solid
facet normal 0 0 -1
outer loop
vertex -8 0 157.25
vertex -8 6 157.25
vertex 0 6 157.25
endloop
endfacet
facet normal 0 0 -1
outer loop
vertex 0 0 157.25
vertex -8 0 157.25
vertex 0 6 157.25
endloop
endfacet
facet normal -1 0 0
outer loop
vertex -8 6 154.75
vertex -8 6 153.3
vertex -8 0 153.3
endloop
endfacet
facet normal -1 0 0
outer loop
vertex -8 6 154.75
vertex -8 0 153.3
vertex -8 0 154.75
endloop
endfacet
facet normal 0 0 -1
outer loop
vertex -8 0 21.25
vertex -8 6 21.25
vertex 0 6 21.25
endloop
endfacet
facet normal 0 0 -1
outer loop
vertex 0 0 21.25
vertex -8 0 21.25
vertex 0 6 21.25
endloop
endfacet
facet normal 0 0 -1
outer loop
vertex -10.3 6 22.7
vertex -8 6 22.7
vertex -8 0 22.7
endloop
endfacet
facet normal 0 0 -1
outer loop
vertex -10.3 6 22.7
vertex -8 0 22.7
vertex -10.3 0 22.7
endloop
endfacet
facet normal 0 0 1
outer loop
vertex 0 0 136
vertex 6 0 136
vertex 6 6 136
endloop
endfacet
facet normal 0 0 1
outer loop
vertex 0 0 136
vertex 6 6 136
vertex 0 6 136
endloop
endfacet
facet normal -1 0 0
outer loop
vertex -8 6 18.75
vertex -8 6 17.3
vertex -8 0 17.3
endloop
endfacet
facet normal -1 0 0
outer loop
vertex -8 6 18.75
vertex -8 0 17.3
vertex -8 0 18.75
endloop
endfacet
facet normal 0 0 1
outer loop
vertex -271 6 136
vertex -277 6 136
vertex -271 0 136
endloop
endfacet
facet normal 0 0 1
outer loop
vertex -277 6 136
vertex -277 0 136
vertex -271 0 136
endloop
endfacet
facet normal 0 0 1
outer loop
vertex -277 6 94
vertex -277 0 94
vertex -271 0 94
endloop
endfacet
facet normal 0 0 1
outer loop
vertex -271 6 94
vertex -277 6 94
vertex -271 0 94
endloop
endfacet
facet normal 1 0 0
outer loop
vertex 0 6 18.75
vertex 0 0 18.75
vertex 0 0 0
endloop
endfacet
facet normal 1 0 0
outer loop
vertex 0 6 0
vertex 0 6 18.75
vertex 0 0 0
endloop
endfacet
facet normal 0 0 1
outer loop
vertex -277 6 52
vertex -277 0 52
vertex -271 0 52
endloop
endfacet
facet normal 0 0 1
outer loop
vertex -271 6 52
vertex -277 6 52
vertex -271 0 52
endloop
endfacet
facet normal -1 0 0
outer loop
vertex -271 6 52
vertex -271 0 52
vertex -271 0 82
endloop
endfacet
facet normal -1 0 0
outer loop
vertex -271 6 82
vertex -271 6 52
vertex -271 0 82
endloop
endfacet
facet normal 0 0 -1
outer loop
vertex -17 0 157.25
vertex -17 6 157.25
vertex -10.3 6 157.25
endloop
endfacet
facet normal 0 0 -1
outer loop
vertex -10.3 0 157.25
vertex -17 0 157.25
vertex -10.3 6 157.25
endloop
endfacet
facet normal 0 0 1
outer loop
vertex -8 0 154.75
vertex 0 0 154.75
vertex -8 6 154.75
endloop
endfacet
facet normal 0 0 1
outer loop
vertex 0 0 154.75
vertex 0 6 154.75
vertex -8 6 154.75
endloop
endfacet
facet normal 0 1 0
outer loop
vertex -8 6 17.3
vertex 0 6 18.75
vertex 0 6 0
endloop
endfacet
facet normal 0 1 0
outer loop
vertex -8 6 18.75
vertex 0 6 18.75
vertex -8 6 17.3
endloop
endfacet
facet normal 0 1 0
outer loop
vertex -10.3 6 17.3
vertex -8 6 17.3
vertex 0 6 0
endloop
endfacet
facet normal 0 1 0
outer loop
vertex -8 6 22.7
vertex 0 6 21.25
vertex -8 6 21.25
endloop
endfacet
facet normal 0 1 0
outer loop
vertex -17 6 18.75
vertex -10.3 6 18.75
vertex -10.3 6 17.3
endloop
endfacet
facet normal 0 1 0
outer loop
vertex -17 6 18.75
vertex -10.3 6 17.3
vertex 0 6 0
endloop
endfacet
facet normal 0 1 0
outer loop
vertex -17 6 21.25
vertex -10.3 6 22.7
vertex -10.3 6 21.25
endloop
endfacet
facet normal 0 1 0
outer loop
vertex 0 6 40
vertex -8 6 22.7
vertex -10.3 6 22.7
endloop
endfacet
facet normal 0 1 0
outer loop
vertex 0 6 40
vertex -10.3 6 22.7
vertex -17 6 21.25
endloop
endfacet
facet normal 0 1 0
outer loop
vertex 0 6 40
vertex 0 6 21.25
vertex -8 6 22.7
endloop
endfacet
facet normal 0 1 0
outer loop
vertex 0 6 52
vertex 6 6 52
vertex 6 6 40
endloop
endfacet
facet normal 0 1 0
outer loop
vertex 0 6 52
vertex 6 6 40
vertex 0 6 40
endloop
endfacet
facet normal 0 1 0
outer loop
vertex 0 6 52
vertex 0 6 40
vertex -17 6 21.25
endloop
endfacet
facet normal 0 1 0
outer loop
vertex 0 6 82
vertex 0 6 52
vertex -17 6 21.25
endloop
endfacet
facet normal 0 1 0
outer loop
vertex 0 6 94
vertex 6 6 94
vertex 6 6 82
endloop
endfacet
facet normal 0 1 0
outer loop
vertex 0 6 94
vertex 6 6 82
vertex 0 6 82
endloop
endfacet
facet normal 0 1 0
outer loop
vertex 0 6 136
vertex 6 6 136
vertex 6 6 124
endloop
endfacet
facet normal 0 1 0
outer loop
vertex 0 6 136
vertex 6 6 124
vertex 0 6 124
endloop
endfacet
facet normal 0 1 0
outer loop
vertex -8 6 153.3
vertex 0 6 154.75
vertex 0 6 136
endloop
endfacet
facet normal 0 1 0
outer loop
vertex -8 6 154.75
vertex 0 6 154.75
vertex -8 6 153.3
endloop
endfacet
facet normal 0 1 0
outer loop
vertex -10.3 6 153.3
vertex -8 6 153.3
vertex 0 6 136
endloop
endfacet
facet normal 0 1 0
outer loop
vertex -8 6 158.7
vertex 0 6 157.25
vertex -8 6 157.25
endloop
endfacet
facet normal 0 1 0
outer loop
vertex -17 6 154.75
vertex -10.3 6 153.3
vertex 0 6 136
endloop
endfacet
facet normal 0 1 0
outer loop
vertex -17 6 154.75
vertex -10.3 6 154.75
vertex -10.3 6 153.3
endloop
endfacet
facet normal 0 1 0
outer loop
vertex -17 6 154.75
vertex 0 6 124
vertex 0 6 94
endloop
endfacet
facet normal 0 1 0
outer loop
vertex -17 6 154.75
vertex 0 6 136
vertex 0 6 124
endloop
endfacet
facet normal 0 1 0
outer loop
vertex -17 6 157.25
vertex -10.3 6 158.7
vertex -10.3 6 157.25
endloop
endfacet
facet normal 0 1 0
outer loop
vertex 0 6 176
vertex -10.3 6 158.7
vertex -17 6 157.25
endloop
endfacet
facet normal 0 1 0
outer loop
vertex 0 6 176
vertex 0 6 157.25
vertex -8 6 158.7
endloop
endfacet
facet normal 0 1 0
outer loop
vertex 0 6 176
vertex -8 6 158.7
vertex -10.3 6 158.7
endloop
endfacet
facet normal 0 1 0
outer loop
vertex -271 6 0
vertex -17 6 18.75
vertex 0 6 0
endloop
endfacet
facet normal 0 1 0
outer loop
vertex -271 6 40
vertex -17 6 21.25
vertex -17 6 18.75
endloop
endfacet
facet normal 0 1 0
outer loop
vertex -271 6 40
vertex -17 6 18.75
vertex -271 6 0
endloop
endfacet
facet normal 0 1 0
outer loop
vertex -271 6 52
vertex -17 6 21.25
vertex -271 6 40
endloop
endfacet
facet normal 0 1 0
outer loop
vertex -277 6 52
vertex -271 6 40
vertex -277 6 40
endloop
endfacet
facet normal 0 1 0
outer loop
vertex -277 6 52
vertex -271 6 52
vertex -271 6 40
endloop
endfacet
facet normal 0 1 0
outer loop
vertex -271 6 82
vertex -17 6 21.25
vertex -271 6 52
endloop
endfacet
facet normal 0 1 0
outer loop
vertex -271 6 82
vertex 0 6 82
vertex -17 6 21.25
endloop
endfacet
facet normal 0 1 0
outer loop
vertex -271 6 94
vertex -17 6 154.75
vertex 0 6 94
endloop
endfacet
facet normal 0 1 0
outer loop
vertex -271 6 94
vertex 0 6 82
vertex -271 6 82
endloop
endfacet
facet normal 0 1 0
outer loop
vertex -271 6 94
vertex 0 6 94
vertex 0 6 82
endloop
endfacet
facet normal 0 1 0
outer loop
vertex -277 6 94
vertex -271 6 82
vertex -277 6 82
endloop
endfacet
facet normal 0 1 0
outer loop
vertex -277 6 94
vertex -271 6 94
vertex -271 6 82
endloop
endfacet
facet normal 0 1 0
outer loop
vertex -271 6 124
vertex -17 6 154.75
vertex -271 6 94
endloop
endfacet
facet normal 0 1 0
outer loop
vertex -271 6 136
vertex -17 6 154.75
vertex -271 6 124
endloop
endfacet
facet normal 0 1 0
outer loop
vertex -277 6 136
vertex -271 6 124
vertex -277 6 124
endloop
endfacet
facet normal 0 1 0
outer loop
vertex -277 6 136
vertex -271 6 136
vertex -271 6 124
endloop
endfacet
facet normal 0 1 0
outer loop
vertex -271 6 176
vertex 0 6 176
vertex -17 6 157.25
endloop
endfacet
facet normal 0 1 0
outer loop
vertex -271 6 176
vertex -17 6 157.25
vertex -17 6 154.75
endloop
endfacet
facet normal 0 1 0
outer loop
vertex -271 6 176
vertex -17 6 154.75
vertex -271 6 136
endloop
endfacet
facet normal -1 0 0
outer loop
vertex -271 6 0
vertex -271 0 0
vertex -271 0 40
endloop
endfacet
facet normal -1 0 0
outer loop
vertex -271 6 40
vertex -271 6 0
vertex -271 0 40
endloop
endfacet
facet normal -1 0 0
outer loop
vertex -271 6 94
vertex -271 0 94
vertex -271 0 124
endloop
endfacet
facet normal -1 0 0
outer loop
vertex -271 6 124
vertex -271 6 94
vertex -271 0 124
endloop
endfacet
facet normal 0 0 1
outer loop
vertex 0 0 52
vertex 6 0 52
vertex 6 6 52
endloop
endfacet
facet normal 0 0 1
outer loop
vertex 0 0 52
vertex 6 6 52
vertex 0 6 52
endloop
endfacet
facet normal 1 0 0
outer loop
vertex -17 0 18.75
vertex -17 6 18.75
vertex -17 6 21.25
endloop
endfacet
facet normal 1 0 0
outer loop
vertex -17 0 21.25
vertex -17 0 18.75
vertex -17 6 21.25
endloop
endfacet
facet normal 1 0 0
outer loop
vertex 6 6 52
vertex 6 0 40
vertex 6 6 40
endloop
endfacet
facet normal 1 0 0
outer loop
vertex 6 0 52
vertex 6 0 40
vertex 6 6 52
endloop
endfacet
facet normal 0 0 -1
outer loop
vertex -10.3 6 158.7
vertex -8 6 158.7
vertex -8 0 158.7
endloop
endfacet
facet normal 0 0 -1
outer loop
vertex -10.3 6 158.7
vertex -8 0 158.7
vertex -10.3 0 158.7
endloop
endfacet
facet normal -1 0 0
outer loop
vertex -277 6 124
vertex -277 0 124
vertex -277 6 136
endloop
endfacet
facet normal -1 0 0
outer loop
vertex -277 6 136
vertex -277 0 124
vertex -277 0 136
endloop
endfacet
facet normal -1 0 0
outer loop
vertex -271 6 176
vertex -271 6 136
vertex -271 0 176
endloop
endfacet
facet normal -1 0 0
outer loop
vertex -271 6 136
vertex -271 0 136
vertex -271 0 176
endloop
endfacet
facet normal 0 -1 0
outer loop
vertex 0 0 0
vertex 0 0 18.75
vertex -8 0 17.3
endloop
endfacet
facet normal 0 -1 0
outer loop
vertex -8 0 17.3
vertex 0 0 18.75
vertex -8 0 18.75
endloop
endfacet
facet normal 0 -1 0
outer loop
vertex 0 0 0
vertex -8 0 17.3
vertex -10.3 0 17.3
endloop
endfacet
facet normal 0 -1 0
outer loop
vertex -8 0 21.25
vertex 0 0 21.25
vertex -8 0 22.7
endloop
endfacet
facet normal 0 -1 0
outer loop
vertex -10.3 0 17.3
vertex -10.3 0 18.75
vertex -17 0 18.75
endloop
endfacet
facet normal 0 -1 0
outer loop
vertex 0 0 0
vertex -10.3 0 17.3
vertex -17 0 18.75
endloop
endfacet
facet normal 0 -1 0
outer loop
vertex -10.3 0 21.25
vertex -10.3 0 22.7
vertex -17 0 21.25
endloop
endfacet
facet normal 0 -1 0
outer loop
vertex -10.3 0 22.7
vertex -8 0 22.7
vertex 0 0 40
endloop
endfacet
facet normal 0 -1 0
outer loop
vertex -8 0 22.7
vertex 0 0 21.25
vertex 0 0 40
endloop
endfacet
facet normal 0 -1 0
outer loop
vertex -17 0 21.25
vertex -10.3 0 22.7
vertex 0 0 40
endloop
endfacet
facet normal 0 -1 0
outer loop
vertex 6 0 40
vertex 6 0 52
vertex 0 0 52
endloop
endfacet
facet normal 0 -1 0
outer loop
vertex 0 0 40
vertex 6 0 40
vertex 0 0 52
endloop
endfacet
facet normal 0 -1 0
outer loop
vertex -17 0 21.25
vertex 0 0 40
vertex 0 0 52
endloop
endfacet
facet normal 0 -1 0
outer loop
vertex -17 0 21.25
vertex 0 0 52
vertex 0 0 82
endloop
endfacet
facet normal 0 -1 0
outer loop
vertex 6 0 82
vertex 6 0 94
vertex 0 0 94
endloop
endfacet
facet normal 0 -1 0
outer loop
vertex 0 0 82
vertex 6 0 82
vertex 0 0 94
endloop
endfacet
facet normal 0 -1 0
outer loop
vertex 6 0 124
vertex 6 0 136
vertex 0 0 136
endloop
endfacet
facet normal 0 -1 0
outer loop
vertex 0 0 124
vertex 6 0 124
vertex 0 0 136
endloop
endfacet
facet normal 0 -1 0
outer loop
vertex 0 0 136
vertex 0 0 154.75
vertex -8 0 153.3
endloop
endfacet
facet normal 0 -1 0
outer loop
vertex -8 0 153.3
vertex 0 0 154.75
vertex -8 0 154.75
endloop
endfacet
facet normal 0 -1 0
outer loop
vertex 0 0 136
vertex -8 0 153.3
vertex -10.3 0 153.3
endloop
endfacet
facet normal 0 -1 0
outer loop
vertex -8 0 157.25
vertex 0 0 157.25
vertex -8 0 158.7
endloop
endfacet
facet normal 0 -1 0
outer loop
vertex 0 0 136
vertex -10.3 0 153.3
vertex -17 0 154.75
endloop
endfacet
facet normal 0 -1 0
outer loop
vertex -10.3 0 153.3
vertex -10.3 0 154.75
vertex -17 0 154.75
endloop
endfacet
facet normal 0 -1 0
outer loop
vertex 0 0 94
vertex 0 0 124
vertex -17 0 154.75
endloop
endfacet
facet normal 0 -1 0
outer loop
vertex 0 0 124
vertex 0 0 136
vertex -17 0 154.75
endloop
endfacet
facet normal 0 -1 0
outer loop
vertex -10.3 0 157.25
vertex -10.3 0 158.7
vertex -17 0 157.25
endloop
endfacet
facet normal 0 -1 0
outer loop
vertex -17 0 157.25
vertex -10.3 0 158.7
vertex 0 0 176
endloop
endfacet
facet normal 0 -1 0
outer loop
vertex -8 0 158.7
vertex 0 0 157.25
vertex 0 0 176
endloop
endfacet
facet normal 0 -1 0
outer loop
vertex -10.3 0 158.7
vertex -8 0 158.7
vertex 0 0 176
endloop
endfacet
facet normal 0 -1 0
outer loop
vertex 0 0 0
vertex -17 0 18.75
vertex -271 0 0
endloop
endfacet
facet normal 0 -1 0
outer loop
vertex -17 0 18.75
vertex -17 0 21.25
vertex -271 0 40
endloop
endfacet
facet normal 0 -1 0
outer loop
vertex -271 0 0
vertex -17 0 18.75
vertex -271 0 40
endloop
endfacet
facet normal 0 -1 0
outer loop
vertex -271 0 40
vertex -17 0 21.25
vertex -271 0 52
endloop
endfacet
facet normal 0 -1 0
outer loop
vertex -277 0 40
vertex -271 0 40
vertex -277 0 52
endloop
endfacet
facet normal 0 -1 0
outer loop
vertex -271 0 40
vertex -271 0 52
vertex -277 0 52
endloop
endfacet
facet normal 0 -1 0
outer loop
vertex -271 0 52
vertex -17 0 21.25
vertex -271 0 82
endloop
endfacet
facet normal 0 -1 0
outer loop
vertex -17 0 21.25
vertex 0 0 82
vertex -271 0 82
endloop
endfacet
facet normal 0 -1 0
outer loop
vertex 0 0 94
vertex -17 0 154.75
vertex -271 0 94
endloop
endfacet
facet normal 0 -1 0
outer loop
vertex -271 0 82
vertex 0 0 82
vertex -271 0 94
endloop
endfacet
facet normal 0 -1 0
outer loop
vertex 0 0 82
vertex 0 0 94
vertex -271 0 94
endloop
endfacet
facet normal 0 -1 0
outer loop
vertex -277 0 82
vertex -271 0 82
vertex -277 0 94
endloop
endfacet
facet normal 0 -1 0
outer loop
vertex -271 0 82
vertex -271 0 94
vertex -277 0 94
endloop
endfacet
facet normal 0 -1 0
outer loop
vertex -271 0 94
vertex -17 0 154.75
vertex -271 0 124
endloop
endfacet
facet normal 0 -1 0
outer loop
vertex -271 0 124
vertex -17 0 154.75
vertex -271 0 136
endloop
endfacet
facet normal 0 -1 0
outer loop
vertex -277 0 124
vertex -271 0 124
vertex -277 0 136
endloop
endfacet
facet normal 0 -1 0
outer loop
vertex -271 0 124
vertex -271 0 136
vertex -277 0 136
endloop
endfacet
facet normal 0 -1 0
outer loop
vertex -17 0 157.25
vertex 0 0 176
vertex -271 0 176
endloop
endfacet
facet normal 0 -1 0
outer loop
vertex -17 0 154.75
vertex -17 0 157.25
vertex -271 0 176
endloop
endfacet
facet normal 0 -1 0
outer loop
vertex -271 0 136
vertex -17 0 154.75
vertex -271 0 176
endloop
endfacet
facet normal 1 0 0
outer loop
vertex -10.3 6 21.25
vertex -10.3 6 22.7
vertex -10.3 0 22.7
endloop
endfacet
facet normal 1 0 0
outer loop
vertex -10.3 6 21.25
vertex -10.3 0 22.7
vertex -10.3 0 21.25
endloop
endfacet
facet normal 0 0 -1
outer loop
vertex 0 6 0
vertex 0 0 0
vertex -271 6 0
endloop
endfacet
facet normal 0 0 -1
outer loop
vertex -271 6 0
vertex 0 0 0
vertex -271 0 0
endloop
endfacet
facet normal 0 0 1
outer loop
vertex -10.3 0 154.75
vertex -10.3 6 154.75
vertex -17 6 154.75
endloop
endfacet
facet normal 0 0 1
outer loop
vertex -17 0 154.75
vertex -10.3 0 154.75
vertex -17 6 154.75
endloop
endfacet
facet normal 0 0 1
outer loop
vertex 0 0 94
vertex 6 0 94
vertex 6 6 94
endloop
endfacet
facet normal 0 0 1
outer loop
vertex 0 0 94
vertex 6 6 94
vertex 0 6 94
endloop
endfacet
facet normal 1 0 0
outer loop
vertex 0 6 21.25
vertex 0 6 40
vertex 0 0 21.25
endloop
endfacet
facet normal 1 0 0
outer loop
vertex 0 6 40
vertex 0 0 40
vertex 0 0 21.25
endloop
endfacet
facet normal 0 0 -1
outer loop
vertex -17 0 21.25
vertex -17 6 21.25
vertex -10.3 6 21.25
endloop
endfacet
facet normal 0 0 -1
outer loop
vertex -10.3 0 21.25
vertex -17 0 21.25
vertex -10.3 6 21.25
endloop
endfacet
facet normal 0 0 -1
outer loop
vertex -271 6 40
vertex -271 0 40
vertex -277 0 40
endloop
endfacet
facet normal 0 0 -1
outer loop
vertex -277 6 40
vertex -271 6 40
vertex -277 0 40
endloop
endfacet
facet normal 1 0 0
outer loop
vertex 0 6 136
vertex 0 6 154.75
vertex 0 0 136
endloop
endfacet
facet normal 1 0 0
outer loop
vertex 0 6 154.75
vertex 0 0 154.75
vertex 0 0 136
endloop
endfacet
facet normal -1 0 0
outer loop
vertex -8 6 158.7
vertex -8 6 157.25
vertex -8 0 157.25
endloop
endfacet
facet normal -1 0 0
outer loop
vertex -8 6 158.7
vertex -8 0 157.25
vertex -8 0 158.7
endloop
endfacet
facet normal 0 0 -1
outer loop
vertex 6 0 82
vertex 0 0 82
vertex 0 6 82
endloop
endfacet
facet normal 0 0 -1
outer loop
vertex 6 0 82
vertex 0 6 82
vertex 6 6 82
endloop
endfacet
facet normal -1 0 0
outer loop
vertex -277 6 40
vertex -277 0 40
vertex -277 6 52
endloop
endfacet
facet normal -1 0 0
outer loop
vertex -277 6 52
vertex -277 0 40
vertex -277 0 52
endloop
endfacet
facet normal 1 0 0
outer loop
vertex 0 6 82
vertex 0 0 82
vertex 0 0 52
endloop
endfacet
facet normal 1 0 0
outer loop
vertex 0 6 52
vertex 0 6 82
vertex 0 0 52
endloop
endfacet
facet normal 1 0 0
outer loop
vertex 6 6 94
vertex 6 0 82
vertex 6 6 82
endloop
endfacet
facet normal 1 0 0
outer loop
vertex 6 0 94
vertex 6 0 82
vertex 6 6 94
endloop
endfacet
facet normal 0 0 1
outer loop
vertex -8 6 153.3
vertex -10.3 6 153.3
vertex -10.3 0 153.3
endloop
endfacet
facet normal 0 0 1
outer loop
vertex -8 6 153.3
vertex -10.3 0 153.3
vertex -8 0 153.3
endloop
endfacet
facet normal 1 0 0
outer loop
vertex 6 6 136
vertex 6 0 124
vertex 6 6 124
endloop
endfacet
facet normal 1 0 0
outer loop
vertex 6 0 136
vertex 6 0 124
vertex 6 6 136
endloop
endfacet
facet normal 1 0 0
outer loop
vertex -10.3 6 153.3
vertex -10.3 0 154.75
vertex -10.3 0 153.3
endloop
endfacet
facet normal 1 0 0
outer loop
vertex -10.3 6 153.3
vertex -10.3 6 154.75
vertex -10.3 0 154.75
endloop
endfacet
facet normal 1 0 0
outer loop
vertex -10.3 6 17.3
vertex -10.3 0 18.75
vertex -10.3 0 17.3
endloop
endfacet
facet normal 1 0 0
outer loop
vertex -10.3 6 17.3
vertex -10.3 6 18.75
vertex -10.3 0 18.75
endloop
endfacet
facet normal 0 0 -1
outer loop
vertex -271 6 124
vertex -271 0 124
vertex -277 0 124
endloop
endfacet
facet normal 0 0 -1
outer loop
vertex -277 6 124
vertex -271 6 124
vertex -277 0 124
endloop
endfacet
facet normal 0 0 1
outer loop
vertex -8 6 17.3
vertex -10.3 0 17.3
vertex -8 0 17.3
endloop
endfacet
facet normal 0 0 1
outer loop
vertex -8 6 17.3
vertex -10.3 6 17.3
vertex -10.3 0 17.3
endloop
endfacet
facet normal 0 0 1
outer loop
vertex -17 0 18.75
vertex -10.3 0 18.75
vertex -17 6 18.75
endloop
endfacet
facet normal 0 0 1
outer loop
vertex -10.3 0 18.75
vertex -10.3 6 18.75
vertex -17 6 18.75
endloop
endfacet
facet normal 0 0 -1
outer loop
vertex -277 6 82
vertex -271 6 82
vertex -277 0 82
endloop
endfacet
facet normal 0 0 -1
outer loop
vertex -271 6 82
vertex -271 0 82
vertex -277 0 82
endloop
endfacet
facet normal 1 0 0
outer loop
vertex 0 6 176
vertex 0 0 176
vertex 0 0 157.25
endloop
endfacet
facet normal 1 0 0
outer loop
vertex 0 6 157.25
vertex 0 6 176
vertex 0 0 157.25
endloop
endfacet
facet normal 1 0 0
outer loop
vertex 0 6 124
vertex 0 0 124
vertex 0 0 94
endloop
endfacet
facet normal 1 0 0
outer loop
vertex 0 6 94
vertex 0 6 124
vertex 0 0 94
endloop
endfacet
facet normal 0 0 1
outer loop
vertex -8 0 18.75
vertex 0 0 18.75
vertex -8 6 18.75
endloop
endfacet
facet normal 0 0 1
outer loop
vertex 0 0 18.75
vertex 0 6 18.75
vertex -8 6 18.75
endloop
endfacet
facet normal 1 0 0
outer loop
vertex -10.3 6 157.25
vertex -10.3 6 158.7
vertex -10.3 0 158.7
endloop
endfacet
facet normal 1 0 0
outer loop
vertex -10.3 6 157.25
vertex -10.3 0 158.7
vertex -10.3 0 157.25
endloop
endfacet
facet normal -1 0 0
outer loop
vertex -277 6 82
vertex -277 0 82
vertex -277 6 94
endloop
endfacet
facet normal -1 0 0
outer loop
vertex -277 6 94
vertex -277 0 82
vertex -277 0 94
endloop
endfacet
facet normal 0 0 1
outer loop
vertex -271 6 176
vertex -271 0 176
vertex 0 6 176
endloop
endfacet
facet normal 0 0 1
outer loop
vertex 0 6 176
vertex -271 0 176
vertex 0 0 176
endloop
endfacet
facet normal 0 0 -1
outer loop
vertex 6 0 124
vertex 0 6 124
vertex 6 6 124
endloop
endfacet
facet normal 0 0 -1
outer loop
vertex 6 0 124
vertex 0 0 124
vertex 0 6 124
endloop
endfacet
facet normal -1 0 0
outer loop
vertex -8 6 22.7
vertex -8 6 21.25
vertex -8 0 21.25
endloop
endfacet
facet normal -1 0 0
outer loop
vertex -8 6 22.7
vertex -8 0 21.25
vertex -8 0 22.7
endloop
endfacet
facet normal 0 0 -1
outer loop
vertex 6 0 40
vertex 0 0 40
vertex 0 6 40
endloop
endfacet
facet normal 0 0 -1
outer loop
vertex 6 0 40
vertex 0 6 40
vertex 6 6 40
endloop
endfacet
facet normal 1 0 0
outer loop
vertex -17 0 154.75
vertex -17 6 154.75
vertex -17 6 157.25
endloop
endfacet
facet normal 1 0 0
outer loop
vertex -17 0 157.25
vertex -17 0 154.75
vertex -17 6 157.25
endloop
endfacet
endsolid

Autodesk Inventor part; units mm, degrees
ref_plane "YZ Plane" through (0, 0, 0) normal (1, 0, 0) x (0, 1, 0)
ref_plane "XZ Plane" through (0, 0, 0) normal (0, 1, 0) x (-1, 0, 0)
ref_plane "XY Plane" through (0, 0, 0) normal (0, 0, 1) x (1, 0, 0)
sketch "Sketch1" plane through (0, 0, 0) normal (0, 1, 0) x (-1, 0, 0)
  line L0 (0, 0) -> (271, 0)
  line L1 (271, 0) -> (271, 176)
  line L2 (271, 176) -> (0, 176)
  line L3 (0, 176) -> (0, 0)
  line L4 (-6, 136) -> (0, 136)
  line L5 (0, 136) -> (0, 124)
  line L6 (0, 124) -> (-6, 124)
  line L7 (-6, 124) -> (-6, 136)
  line L8 (-6, 94) -> (0, 94)
  line L9 (0, 94) -> (0, 82)
  line L10 (0, 82) -> (-6, 82)
  line L11 (-6, 82) -> (-6, 94)
  line L12 (-6, 52) -> (0, 52)
  line L13 (0, 52) -> (0, 40)
  line L14 (0, 40) -> (-6, 40)
  line L15 (-6, 40) -> (-6, 52)
  circle A0 centre (-3, 156) radius 1.25
  circle A1 centre (-3, 20) radius 1.25
  line L16 (-3, 40) -> (-3, 20) construction
  line L17 (135.5, 176) -> (135.5, 0) construction
  line L18 (277, 40) -> (277, 52)
  line L19 (271, 40) -> (277, 40)
  line L20 (271, 52) -> (271, 40)
  line L21 (277, 52) -> (271, 52)
  line L22 (271, 82) -> (277, 82)
  line L23 (277, 94) -> (271, 94)
  line L24 (271, 94) -> (271, 82)
  line L25 (277, 82) -> (277, 94)
  line L26 (271, 124) -> (277, 124)
  line L27 (271, 136) -> (271, 124)
  line L28 (277, 136) -> (271, 136)
  line L29 (277, 124) -> (277, 136)
  point P0 (274, 40)
  dimension "d0" = 271
  dimension "d2" = 6
  dimension "d3" = 12
  dimension "d4" = 30
  dimension "d5" = 30
  dimension "d6" = 2.5
  dimension "d7" = 2.5
  dimension "d8" = 20
  dimension "d9" = 20
  dimension "d10" = 20
  dimension "d13" = 20
extrude "Extrusion1" add sketch "Sketch1" along normal blind 6 contours L3 L2 L1 L0 | L14 L15 L12 L3 | L1 L21 L18 L19 | L10 L11 L8 L3 | L1 L23 L25 L22 | L6 L7 L4 L3 | L1 L28 L29 L26
sketch "Sketch2" plane through (0, 6, 0) normal (0, 1, 0) x (1, 0, 0)
  line L0 (0, -40) -> (0, 0) projected
  line L1 (0, -18.75) -> (-8, -18.75)
  line L2 (-17, -18.75) -> (-17, -21.25)
  line L3 (-17, -21.25) -> (-10.3, -21.25)
  line L4 (0, -21.25) -> (0, -18.75)
  line L5 (0, 0) -> (-271, 0) projected
  line L6 (-8, -22.7) -> (-10.3, -22.7)
  line L7 (-10.3, -22.7) -> (-10.3, -21.25)
  line L8 (-10.3, -17.3) -> (-8, -17.3)
  line L9 (-8, -17.3) -> (-8, -18.75)
  line L10 (-8, -21.25) -> (-8, -22.7)
  line L11 (-8, -18.75) -> (-8, -21.25) construction
  line L12 (-10.3, -21.25) -> (-10.3, -18.75) construction
  line L13 (-10.3, -18.75) -> (-10.3, -17.3)
  line L14 (-8, -21.25) -> (0, -21.25)
  line L15 (-10.3, -21.25) -> (-8, -21.25) construction
  line L16 (-8, -18.75) -> (-10.3, -18.75) construction
  line L17 (-10.3, -18.75) -> (-17, -18.75)
  line L18 (0, -154.75) -> (-8, -154.75)
  line L19 (-17, -154.75) -> (-17, -157.25)
  line L20 (-17, -157.25) -> (-10.3, -157.25)
  line L21 (0, -157.25) -> (0, -154.75)
  line L22 (-8, -158.7) -> (-10.3, -158.7)
  line L23 (-10.3, -158.7) -> (-10.3, -157.25)
  line L24 (-10.3, -153.3) -> (-8, -153.3)
  line L25 (-8, -153.3) -> (-8, -154.75)
  line L26 (-8, -157.25) -> (-8, -158.7)
  line L27 (-8, -154.75) -> (-8, -157.25) construction
  line L28 (-10.3, -157.25) -> (-10.3, -154.75) construction
  line L29 (-10.3, -154.75) -> (-10.3, -153.3)
  line L30 (-8, -157.25) -> (0, -157.25)
  line L31 (-10.3, -157.25) -> (-8, -157.25) construction
  line L32 (-8, -154.75) -> (-10.3, -154.75) construction
  line L33 (-10.3, -154.75) -> (-17, -154.75)
  line L34 (0, -176) -> (0, -136) projected
  line L35 (-271, -176) -> (0, -176) projected
  dimension "d14" = 17
  dimension "d15" = 2.5
  dimension "d16" = 18.75
  dimension "d19" = 2.3
  dimension "d20" = 5.4
  dimension "d21" = 8
  dimension "d22" = 17
  dimension "d23" = 2.5
  dimension "d24" = 2.3
  dimension "d25" = 5.4
  dimension "d26" = 18.75
extrude "Extrusion2" cut sketch "Sketch2" against normal through all
equation "\"d5\" = d4"
equation "\"d6\" = d7"
equation "\"d9\" = d8"
equation "\"d26\" = d16"
properties part number "pinball-case-back"
